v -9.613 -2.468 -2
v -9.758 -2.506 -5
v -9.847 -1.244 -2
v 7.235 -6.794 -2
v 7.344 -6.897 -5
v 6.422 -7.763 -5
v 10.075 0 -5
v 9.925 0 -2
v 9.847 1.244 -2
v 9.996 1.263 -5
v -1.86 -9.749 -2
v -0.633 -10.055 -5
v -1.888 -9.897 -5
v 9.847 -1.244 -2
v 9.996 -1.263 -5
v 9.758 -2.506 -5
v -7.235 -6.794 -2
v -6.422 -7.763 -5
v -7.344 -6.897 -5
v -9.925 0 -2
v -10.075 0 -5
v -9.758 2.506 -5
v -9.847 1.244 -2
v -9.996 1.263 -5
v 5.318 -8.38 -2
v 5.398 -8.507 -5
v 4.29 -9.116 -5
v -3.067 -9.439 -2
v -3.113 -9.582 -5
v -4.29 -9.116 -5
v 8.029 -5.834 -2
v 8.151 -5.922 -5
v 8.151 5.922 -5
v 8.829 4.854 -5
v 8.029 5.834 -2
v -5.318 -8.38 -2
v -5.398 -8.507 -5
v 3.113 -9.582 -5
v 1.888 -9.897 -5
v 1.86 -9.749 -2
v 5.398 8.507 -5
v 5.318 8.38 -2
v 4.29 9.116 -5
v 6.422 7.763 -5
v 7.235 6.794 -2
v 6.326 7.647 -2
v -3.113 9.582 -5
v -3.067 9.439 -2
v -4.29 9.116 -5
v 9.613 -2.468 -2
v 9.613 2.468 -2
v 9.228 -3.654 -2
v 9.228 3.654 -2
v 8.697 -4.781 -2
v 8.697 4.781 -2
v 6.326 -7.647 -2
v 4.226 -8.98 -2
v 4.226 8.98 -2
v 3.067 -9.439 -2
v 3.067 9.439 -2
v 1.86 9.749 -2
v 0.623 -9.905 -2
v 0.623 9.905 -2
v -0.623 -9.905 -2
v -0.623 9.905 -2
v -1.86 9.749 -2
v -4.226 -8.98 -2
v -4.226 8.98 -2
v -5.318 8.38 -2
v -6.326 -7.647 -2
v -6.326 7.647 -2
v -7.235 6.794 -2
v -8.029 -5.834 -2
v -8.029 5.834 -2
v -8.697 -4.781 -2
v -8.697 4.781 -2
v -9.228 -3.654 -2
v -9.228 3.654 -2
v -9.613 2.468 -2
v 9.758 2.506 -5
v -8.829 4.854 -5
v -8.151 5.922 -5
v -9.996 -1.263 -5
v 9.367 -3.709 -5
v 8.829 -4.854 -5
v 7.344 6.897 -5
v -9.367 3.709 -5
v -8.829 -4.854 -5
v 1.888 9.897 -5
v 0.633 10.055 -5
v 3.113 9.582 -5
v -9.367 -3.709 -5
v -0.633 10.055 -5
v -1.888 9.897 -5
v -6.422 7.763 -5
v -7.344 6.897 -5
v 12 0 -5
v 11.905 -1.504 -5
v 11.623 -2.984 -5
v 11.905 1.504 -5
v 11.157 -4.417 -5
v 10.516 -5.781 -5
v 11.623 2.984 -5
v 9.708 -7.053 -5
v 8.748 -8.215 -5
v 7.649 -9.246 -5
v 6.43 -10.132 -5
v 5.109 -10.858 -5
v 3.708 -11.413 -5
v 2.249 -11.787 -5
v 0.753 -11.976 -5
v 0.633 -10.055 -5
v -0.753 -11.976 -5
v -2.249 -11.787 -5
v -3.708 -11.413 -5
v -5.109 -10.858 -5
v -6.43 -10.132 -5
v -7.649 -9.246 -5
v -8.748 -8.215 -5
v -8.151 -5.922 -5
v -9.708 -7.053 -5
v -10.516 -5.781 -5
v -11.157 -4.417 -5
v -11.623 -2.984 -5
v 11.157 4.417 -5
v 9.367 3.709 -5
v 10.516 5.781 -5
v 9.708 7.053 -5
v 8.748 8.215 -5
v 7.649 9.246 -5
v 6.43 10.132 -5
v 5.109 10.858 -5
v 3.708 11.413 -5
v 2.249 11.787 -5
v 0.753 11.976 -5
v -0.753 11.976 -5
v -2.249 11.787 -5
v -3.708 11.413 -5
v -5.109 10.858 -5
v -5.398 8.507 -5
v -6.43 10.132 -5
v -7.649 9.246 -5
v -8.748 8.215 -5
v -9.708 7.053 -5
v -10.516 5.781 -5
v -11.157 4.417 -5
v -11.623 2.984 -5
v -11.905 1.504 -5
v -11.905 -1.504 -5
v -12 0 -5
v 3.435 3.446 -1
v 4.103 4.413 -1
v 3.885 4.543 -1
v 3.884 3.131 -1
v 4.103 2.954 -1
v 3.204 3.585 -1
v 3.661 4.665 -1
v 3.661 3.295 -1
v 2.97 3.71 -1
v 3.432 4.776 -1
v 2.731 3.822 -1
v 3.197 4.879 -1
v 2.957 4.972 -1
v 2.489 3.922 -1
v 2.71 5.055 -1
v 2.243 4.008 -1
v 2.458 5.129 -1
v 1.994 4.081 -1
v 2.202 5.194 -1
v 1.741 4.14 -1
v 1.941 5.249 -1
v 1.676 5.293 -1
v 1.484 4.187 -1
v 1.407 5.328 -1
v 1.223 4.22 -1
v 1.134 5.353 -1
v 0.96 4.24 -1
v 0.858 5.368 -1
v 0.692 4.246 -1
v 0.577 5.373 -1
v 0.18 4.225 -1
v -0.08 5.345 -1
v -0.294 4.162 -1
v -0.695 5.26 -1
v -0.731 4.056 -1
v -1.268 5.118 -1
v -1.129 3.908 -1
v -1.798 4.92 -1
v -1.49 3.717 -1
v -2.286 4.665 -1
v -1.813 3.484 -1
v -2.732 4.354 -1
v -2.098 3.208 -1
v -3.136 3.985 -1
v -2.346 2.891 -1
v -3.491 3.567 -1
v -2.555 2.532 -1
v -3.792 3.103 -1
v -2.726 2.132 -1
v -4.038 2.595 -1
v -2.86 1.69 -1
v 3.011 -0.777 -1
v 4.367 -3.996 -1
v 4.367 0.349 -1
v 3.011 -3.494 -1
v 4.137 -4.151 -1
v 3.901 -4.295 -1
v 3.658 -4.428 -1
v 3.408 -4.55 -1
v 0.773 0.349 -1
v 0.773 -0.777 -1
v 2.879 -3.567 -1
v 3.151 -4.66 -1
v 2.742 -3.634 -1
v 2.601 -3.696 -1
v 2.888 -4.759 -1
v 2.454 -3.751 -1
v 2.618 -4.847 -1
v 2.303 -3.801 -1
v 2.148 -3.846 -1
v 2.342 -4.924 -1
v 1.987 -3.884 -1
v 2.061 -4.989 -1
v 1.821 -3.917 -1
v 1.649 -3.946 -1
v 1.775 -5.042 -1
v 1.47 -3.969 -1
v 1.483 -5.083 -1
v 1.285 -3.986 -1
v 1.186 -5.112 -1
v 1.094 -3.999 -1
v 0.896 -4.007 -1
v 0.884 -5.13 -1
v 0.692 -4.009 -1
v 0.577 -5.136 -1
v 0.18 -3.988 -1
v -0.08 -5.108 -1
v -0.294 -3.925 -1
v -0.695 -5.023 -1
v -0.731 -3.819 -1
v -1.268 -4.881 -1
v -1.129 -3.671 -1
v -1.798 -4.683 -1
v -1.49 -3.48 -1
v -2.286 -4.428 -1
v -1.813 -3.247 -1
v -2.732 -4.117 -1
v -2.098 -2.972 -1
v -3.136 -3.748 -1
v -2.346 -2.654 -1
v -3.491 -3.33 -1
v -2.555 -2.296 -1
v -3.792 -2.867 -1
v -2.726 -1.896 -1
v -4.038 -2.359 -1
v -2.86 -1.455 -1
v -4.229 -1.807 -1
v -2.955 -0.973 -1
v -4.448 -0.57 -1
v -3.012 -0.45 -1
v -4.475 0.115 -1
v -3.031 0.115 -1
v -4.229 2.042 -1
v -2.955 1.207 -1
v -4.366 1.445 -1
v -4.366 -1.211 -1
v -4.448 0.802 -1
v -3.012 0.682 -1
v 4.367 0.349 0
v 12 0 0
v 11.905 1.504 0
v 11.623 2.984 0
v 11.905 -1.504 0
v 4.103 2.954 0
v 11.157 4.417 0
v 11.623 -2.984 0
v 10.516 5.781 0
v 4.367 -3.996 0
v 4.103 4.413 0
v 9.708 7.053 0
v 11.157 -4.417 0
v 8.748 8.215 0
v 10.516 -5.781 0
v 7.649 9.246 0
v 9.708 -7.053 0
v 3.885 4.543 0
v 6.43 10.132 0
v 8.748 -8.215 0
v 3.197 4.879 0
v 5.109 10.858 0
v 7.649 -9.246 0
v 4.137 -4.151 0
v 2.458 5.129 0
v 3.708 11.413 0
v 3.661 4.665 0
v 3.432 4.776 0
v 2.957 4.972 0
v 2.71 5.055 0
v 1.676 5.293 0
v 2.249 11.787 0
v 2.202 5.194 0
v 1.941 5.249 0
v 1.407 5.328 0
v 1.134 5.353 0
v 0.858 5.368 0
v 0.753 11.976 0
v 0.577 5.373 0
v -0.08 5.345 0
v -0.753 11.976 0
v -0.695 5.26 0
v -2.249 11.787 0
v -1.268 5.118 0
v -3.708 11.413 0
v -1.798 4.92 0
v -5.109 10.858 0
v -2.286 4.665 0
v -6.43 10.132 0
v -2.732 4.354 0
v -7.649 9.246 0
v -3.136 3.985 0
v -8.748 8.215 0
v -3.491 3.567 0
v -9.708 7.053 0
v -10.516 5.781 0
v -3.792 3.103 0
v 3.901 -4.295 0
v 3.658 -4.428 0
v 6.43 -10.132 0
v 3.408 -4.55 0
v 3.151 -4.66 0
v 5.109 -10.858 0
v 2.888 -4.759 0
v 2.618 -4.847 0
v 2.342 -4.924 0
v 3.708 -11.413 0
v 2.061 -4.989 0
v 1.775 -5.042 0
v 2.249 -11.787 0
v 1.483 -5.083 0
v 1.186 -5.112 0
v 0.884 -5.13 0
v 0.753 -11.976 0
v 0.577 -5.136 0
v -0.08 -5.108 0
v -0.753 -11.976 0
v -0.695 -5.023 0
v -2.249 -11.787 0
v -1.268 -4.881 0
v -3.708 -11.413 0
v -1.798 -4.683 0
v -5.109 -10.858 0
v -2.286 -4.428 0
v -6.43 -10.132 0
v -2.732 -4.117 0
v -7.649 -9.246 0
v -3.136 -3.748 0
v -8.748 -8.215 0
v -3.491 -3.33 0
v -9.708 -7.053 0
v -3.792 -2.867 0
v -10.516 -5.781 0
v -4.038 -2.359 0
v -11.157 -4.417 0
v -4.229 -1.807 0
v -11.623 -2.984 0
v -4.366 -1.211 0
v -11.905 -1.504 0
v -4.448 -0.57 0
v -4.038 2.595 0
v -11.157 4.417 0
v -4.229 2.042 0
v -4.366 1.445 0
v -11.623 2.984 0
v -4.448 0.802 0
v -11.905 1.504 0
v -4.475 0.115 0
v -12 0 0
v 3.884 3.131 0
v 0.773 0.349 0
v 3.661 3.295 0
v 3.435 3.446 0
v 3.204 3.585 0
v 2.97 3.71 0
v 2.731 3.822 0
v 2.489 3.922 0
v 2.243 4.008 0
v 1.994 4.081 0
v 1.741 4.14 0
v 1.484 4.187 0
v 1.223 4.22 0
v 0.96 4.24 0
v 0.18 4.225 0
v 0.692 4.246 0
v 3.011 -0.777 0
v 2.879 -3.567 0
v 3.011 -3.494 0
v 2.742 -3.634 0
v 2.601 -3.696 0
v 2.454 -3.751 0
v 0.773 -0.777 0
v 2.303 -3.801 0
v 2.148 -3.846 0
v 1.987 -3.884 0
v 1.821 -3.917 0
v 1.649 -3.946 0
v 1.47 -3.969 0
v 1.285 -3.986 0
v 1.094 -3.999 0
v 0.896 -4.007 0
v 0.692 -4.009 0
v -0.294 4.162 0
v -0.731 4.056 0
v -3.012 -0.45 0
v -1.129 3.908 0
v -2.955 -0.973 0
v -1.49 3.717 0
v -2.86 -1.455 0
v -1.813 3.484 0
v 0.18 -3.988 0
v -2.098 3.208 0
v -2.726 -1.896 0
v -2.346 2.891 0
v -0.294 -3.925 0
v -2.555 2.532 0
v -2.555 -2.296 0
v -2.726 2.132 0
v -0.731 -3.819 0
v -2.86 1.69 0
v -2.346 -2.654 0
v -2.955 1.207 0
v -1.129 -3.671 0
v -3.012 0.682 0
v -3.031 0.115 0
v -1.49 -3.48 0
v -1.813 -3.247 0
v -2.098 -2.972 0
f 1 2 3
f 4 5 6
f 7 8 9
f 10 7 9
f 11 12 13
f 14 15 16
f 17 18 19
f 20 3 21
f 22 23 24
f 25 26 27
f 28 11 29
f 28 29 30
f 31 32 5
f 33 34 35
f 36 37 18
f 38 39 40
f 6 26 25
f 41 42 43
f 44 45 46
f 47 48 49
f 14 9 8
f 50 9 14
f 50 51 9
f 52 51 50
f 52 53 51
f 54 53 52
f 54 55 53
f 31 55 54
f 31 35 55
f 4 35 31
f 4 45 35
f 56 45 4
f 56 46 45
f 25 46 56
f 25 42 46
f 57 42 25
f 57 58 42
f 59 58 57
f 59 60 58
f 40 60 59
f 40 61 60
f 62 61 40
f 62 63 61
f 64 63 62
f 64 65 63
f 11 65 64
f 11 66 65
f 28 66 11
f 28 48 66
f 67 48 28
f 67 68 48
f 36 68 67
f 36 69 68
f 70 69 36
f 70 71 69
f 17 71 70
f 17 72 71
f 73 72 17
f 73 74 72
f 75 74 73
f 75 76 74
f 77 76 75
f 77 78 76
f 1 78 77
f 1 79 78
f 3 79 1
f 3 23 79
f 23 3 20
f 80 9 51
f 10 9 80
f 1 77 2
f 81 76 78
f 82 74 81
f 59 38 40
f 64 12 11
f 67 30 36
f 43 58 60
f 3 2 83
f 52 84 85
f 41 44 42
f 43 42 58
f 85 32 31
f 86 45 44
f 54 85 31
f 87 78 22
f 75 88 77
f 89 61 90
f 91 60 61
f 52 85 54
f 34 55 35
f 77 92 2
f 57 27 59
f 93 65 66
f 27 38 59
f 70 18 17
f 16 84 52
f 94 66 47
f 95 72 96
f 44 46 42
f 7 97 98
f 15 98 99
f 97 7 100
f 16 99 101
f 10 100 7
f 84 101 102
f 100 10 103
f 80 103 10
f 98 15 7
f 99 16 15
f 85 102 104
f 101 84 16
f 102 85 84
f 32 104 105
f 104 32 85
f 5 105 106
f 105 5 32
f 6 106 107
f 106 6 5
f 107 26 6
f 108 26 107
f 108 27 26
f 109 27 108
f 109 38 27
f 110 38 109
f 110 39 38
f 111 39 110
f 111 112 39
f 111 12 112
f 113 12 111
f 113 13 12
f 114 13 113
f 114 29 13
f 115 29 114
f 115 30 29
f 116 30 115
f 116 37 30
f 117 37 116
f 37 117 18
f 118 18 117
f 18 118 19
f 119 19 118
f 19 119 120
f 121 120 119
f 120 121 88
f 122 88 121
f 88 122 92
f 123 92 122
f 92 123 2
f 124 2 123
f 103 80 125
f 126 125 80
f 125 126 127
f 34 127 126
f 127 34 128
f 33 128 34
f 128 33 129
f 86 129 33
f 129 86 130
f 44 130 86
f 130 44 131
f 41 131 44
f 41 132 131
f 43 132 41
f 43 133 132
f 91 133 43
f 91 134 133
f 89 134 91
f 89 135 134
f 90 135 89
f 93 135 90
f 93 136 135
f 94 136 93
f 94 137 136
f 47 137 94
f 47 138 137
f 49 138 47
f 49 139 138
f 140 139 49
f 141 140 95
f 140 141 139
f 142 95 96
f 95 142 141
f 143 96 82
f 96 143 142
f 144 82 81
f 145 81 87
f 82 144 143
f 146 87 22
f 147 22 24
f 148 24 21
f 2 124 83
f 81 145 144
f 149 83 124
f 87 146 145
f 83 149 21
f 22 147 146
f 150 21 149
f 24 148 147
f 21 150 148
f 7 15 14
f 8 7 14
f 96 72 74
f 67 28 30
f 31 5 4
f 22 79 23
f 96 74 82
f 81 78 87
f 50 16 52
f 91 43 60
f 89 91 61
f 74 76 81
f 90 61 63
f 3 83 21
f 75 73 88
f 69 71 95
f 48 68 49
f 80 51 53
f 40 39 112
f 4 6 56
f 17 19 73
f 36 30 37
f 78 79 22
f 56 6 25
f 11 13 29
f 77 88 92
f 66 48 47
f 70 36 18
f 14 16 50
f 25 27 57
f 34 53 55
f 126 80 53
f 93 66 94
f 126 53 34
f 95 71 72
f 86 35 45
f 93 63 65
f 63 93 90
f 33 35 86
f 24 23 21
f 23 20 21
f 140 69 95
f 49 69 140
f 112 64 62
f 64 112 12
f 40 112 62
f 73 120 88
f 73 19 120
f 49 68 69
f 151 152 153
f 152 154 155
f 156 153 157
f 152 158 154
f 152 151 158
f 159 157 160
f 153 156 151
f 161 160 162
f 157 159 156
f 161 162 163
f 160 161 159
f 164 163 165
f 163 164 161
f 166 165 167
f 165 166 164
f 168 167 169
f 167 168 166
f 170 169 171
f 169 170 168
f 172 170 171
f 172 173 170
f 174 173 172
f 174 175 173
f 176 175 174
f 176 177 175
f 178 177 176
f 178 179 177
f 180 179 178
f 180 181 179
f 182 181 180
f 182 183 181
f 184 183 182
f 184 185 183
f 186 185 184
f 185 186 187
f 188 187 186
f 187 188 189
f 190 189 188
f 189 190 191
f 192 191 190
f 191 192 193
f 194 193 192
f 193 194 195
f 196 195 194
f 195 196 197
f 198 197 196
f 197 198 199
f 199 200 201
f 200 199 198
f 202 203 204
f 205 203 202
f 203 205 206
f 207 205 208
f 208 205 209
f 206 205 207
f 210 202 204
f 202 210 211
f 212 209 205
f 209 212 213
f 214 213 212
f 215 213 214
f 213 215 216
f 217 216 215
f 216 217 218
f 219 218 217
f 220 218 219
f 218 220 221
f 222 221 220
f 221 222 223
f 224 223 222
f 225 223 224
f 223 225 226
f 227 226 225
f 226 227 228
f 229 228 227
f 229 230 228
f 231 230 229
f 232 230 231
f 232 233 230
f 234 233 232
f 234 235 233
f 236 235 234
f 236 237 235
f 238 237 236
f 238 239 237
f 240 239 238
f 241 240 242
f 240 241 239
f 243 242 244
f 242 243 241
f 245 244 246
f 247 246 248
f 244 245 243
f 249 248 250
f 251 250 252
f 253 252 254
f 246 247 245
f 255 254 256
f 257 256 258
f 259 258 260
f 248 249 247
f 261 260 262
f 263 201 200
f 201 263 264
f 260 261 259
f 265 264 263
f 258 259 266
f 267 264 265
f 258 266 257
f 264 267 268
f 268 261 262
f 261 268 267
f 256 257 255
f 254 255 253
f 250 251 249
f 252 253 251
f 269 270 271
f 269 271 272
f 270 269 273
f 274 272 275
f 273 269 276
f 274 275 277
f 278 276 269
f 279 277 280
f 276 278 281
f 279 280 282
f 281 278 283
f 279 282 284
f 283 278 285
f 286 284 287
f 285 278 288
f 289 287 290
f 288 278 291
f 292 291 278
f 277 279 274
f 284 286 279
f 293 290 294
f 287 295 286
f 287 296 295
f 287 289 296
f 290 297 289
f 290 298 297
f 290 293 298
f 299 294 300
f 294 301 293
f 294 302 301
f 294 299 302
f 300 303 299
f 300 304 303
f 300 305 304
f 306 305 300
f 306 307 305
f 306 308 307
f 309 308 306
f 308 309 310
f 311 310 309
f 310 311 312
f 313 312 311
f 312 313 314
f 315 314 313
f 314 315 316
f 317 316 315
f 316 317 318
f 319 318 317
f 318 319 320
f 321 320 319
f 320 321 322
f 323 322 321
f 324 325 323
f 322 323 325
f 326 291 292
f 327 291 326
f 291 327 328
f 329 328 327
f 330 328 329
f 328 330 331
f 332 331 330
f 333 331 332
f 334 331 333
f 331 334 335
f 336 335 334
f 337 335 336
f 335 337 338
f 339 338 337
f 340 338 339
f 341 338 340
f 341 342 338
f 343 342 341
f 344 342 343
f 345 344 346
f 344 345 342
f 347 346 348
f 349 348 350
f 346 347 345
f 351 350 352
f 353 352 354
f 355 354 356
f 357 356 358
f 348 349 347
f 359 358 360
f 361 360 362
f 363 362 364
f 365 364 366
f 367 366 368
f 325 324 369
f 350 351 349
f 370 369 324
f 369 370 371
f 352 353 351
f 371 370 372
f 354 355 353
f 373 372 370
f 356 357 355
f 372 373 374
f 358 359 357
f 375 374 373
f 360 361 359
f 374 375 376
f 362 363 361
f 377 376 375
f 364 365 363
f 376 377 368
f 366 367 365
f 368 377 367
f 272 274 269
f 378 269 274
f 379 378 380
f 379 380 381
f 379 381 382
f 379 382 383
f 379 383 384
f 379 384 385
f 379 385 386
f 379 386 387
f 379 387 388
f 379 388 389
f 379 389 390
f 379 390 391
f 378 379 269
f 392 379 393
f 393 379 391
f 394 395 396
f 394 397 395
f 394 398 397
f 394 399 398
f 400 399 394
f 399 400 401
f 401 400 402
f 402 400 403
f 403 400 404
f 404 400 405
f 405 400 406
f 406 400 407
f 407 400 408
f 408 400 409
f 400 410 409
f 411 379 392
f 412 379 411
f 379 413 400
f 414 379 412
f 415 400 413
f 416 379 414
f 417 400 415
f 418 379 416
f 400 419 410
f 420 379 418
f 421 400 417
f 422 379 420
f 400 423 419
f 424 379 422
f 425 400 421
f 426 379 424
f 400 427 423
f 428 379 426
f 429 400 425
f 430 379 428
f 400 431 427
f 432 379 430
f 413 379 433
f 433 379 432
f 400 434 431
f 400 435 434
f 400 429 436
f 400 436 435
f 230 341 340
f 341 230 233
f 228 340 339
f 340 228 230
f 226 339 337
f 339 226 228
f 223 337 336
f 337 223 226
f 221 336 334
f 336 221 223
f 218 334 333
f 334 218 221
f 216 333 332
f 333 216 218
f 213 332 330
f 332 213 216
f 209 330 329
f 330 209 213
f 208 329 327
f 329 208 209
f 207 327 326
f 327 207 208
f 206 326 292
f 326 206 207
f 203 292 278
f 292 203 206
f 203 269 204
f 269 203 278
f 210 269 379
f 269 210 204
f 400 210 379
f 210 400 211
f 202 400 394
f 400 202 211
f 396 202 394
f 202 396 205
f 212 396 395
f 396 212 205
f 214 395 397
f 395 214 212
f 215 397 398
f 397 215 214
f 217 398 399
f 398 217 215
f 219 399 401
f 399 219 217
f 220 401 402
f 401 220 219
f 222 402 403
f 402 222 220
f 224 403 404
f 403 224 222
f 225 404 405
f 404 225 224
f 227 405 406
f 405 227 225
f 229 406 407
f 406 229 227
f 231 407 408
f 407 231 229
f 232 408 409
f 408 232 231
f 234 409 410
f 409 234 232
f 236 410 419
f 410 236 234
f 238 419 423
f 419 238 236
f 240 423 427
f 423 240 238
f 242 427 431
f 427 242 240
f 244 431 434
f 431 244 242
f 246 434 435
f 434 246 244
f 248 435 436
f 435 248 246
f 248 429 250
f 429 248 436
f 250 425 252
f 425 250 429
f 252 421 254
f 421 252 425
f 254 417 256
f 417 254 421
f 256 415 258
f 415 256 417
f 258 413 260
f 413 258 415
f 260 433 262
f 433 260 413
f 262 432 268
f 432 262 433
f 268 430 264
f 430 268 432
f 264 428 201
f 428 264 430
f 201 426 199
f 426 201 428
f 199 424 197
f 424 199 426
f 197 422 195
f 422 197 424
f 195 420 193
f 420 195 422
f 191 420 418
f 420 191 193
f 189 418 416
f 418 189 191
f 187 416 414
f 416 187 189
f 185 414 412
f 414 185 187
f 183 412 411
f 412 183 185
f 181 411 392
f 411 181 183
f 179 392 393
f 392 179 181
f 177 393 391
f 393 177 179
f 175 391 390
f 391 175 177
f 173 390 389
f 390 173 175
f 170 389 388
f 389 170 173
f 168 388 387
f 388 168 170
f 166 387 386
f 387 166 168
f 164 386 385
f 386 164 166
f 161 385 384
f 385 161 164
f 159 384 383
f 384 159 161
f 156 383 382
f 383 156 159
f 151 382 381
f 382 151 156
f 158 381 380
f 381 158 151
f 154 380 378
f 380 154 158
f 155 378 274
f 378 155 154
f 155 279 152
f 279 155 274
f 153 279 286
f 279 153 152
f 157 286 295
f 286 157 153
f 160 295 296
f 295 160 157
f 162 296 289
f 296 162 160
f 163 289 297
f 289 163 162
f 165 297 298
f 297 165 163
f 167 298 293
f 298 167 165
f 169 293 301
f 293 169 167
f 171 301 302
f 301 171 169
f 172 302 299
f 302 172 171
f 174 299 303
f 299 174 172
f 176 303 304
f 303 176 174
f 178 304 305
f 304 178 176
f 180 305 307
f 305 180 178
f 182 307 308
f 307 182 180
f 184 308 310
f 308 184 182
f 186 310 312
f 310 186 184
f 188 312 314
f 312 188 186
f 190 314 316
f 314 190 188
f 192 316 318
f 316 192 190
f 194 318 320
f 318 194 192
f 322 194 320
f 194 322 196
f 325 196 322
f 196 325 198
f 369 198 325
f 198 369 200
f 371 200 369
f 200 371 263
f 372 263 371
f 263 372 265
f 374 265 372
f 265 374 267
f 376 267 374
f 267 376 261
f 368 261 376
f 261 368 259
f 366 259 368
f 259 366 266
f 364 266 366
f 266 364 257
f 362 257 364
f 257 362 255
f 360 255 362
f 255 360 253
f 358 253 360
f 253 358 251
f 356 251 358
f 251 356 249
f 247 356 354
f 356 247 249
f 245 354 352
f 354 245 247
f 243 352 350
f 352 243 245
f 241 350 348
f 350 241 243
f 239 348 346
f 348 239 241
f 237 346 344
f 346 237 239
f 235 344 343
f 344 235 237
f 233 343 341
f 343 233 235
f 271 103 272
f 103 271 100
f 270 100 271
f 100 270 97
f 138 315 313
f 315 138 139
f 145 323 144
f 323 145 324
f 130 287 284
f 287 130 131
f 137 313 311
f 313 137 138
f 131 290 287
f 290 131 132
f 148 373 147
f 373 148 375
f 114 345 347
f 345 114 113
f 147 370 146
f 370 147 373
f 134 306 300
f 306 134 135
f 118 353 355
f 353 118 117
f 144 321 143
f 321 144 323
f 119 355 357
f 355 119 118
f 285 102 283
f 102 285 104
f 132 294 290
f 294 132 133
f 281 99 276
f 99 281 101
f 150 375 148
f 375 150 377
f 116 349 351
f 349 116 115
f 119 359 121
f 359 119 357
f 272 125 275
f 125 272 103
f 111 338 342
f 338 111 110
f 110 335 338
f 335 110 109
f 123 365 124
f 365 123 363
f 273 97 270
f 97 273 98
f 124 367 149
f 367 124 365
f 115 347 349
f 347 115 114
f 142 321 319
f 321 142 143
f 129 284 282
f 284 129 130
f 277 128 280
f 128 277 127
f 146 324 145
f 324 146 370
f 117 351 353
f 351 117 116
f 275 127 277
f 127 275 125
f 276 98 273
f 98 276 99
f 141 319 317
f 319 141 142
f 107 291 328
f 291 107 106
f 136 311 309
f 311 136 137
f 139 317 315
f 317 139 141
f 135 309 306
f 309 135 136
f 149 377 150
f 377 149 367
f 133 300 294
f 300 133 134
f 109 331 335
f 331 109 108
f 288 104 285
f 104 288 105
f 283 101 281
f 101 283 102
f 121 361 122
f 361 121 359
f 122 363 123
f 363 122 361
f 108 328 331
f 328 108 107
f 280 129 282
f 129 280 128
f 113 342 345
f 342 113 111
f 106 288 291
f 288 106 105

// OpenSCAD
$fn = 50;


difference() {
	union() {
		translate(v = [0, 0, -5.0000000000]) {
			cylinder(h = 5, r = 12.0000000000);
		}
	}
	union() {
		#translate(v = [0, 0, -5.0000000000]) {
			cylinder(h = 3, r1 = 10.0750000000, r2 = 9.9250000000);
		}
		translate(v = [0, 0, -1]) {
			linear_extrude(height = 1) {
				text(font = "Impact", halign = "center", size = 10, text = "G", valign = "center");
			}
		}
	}
}
